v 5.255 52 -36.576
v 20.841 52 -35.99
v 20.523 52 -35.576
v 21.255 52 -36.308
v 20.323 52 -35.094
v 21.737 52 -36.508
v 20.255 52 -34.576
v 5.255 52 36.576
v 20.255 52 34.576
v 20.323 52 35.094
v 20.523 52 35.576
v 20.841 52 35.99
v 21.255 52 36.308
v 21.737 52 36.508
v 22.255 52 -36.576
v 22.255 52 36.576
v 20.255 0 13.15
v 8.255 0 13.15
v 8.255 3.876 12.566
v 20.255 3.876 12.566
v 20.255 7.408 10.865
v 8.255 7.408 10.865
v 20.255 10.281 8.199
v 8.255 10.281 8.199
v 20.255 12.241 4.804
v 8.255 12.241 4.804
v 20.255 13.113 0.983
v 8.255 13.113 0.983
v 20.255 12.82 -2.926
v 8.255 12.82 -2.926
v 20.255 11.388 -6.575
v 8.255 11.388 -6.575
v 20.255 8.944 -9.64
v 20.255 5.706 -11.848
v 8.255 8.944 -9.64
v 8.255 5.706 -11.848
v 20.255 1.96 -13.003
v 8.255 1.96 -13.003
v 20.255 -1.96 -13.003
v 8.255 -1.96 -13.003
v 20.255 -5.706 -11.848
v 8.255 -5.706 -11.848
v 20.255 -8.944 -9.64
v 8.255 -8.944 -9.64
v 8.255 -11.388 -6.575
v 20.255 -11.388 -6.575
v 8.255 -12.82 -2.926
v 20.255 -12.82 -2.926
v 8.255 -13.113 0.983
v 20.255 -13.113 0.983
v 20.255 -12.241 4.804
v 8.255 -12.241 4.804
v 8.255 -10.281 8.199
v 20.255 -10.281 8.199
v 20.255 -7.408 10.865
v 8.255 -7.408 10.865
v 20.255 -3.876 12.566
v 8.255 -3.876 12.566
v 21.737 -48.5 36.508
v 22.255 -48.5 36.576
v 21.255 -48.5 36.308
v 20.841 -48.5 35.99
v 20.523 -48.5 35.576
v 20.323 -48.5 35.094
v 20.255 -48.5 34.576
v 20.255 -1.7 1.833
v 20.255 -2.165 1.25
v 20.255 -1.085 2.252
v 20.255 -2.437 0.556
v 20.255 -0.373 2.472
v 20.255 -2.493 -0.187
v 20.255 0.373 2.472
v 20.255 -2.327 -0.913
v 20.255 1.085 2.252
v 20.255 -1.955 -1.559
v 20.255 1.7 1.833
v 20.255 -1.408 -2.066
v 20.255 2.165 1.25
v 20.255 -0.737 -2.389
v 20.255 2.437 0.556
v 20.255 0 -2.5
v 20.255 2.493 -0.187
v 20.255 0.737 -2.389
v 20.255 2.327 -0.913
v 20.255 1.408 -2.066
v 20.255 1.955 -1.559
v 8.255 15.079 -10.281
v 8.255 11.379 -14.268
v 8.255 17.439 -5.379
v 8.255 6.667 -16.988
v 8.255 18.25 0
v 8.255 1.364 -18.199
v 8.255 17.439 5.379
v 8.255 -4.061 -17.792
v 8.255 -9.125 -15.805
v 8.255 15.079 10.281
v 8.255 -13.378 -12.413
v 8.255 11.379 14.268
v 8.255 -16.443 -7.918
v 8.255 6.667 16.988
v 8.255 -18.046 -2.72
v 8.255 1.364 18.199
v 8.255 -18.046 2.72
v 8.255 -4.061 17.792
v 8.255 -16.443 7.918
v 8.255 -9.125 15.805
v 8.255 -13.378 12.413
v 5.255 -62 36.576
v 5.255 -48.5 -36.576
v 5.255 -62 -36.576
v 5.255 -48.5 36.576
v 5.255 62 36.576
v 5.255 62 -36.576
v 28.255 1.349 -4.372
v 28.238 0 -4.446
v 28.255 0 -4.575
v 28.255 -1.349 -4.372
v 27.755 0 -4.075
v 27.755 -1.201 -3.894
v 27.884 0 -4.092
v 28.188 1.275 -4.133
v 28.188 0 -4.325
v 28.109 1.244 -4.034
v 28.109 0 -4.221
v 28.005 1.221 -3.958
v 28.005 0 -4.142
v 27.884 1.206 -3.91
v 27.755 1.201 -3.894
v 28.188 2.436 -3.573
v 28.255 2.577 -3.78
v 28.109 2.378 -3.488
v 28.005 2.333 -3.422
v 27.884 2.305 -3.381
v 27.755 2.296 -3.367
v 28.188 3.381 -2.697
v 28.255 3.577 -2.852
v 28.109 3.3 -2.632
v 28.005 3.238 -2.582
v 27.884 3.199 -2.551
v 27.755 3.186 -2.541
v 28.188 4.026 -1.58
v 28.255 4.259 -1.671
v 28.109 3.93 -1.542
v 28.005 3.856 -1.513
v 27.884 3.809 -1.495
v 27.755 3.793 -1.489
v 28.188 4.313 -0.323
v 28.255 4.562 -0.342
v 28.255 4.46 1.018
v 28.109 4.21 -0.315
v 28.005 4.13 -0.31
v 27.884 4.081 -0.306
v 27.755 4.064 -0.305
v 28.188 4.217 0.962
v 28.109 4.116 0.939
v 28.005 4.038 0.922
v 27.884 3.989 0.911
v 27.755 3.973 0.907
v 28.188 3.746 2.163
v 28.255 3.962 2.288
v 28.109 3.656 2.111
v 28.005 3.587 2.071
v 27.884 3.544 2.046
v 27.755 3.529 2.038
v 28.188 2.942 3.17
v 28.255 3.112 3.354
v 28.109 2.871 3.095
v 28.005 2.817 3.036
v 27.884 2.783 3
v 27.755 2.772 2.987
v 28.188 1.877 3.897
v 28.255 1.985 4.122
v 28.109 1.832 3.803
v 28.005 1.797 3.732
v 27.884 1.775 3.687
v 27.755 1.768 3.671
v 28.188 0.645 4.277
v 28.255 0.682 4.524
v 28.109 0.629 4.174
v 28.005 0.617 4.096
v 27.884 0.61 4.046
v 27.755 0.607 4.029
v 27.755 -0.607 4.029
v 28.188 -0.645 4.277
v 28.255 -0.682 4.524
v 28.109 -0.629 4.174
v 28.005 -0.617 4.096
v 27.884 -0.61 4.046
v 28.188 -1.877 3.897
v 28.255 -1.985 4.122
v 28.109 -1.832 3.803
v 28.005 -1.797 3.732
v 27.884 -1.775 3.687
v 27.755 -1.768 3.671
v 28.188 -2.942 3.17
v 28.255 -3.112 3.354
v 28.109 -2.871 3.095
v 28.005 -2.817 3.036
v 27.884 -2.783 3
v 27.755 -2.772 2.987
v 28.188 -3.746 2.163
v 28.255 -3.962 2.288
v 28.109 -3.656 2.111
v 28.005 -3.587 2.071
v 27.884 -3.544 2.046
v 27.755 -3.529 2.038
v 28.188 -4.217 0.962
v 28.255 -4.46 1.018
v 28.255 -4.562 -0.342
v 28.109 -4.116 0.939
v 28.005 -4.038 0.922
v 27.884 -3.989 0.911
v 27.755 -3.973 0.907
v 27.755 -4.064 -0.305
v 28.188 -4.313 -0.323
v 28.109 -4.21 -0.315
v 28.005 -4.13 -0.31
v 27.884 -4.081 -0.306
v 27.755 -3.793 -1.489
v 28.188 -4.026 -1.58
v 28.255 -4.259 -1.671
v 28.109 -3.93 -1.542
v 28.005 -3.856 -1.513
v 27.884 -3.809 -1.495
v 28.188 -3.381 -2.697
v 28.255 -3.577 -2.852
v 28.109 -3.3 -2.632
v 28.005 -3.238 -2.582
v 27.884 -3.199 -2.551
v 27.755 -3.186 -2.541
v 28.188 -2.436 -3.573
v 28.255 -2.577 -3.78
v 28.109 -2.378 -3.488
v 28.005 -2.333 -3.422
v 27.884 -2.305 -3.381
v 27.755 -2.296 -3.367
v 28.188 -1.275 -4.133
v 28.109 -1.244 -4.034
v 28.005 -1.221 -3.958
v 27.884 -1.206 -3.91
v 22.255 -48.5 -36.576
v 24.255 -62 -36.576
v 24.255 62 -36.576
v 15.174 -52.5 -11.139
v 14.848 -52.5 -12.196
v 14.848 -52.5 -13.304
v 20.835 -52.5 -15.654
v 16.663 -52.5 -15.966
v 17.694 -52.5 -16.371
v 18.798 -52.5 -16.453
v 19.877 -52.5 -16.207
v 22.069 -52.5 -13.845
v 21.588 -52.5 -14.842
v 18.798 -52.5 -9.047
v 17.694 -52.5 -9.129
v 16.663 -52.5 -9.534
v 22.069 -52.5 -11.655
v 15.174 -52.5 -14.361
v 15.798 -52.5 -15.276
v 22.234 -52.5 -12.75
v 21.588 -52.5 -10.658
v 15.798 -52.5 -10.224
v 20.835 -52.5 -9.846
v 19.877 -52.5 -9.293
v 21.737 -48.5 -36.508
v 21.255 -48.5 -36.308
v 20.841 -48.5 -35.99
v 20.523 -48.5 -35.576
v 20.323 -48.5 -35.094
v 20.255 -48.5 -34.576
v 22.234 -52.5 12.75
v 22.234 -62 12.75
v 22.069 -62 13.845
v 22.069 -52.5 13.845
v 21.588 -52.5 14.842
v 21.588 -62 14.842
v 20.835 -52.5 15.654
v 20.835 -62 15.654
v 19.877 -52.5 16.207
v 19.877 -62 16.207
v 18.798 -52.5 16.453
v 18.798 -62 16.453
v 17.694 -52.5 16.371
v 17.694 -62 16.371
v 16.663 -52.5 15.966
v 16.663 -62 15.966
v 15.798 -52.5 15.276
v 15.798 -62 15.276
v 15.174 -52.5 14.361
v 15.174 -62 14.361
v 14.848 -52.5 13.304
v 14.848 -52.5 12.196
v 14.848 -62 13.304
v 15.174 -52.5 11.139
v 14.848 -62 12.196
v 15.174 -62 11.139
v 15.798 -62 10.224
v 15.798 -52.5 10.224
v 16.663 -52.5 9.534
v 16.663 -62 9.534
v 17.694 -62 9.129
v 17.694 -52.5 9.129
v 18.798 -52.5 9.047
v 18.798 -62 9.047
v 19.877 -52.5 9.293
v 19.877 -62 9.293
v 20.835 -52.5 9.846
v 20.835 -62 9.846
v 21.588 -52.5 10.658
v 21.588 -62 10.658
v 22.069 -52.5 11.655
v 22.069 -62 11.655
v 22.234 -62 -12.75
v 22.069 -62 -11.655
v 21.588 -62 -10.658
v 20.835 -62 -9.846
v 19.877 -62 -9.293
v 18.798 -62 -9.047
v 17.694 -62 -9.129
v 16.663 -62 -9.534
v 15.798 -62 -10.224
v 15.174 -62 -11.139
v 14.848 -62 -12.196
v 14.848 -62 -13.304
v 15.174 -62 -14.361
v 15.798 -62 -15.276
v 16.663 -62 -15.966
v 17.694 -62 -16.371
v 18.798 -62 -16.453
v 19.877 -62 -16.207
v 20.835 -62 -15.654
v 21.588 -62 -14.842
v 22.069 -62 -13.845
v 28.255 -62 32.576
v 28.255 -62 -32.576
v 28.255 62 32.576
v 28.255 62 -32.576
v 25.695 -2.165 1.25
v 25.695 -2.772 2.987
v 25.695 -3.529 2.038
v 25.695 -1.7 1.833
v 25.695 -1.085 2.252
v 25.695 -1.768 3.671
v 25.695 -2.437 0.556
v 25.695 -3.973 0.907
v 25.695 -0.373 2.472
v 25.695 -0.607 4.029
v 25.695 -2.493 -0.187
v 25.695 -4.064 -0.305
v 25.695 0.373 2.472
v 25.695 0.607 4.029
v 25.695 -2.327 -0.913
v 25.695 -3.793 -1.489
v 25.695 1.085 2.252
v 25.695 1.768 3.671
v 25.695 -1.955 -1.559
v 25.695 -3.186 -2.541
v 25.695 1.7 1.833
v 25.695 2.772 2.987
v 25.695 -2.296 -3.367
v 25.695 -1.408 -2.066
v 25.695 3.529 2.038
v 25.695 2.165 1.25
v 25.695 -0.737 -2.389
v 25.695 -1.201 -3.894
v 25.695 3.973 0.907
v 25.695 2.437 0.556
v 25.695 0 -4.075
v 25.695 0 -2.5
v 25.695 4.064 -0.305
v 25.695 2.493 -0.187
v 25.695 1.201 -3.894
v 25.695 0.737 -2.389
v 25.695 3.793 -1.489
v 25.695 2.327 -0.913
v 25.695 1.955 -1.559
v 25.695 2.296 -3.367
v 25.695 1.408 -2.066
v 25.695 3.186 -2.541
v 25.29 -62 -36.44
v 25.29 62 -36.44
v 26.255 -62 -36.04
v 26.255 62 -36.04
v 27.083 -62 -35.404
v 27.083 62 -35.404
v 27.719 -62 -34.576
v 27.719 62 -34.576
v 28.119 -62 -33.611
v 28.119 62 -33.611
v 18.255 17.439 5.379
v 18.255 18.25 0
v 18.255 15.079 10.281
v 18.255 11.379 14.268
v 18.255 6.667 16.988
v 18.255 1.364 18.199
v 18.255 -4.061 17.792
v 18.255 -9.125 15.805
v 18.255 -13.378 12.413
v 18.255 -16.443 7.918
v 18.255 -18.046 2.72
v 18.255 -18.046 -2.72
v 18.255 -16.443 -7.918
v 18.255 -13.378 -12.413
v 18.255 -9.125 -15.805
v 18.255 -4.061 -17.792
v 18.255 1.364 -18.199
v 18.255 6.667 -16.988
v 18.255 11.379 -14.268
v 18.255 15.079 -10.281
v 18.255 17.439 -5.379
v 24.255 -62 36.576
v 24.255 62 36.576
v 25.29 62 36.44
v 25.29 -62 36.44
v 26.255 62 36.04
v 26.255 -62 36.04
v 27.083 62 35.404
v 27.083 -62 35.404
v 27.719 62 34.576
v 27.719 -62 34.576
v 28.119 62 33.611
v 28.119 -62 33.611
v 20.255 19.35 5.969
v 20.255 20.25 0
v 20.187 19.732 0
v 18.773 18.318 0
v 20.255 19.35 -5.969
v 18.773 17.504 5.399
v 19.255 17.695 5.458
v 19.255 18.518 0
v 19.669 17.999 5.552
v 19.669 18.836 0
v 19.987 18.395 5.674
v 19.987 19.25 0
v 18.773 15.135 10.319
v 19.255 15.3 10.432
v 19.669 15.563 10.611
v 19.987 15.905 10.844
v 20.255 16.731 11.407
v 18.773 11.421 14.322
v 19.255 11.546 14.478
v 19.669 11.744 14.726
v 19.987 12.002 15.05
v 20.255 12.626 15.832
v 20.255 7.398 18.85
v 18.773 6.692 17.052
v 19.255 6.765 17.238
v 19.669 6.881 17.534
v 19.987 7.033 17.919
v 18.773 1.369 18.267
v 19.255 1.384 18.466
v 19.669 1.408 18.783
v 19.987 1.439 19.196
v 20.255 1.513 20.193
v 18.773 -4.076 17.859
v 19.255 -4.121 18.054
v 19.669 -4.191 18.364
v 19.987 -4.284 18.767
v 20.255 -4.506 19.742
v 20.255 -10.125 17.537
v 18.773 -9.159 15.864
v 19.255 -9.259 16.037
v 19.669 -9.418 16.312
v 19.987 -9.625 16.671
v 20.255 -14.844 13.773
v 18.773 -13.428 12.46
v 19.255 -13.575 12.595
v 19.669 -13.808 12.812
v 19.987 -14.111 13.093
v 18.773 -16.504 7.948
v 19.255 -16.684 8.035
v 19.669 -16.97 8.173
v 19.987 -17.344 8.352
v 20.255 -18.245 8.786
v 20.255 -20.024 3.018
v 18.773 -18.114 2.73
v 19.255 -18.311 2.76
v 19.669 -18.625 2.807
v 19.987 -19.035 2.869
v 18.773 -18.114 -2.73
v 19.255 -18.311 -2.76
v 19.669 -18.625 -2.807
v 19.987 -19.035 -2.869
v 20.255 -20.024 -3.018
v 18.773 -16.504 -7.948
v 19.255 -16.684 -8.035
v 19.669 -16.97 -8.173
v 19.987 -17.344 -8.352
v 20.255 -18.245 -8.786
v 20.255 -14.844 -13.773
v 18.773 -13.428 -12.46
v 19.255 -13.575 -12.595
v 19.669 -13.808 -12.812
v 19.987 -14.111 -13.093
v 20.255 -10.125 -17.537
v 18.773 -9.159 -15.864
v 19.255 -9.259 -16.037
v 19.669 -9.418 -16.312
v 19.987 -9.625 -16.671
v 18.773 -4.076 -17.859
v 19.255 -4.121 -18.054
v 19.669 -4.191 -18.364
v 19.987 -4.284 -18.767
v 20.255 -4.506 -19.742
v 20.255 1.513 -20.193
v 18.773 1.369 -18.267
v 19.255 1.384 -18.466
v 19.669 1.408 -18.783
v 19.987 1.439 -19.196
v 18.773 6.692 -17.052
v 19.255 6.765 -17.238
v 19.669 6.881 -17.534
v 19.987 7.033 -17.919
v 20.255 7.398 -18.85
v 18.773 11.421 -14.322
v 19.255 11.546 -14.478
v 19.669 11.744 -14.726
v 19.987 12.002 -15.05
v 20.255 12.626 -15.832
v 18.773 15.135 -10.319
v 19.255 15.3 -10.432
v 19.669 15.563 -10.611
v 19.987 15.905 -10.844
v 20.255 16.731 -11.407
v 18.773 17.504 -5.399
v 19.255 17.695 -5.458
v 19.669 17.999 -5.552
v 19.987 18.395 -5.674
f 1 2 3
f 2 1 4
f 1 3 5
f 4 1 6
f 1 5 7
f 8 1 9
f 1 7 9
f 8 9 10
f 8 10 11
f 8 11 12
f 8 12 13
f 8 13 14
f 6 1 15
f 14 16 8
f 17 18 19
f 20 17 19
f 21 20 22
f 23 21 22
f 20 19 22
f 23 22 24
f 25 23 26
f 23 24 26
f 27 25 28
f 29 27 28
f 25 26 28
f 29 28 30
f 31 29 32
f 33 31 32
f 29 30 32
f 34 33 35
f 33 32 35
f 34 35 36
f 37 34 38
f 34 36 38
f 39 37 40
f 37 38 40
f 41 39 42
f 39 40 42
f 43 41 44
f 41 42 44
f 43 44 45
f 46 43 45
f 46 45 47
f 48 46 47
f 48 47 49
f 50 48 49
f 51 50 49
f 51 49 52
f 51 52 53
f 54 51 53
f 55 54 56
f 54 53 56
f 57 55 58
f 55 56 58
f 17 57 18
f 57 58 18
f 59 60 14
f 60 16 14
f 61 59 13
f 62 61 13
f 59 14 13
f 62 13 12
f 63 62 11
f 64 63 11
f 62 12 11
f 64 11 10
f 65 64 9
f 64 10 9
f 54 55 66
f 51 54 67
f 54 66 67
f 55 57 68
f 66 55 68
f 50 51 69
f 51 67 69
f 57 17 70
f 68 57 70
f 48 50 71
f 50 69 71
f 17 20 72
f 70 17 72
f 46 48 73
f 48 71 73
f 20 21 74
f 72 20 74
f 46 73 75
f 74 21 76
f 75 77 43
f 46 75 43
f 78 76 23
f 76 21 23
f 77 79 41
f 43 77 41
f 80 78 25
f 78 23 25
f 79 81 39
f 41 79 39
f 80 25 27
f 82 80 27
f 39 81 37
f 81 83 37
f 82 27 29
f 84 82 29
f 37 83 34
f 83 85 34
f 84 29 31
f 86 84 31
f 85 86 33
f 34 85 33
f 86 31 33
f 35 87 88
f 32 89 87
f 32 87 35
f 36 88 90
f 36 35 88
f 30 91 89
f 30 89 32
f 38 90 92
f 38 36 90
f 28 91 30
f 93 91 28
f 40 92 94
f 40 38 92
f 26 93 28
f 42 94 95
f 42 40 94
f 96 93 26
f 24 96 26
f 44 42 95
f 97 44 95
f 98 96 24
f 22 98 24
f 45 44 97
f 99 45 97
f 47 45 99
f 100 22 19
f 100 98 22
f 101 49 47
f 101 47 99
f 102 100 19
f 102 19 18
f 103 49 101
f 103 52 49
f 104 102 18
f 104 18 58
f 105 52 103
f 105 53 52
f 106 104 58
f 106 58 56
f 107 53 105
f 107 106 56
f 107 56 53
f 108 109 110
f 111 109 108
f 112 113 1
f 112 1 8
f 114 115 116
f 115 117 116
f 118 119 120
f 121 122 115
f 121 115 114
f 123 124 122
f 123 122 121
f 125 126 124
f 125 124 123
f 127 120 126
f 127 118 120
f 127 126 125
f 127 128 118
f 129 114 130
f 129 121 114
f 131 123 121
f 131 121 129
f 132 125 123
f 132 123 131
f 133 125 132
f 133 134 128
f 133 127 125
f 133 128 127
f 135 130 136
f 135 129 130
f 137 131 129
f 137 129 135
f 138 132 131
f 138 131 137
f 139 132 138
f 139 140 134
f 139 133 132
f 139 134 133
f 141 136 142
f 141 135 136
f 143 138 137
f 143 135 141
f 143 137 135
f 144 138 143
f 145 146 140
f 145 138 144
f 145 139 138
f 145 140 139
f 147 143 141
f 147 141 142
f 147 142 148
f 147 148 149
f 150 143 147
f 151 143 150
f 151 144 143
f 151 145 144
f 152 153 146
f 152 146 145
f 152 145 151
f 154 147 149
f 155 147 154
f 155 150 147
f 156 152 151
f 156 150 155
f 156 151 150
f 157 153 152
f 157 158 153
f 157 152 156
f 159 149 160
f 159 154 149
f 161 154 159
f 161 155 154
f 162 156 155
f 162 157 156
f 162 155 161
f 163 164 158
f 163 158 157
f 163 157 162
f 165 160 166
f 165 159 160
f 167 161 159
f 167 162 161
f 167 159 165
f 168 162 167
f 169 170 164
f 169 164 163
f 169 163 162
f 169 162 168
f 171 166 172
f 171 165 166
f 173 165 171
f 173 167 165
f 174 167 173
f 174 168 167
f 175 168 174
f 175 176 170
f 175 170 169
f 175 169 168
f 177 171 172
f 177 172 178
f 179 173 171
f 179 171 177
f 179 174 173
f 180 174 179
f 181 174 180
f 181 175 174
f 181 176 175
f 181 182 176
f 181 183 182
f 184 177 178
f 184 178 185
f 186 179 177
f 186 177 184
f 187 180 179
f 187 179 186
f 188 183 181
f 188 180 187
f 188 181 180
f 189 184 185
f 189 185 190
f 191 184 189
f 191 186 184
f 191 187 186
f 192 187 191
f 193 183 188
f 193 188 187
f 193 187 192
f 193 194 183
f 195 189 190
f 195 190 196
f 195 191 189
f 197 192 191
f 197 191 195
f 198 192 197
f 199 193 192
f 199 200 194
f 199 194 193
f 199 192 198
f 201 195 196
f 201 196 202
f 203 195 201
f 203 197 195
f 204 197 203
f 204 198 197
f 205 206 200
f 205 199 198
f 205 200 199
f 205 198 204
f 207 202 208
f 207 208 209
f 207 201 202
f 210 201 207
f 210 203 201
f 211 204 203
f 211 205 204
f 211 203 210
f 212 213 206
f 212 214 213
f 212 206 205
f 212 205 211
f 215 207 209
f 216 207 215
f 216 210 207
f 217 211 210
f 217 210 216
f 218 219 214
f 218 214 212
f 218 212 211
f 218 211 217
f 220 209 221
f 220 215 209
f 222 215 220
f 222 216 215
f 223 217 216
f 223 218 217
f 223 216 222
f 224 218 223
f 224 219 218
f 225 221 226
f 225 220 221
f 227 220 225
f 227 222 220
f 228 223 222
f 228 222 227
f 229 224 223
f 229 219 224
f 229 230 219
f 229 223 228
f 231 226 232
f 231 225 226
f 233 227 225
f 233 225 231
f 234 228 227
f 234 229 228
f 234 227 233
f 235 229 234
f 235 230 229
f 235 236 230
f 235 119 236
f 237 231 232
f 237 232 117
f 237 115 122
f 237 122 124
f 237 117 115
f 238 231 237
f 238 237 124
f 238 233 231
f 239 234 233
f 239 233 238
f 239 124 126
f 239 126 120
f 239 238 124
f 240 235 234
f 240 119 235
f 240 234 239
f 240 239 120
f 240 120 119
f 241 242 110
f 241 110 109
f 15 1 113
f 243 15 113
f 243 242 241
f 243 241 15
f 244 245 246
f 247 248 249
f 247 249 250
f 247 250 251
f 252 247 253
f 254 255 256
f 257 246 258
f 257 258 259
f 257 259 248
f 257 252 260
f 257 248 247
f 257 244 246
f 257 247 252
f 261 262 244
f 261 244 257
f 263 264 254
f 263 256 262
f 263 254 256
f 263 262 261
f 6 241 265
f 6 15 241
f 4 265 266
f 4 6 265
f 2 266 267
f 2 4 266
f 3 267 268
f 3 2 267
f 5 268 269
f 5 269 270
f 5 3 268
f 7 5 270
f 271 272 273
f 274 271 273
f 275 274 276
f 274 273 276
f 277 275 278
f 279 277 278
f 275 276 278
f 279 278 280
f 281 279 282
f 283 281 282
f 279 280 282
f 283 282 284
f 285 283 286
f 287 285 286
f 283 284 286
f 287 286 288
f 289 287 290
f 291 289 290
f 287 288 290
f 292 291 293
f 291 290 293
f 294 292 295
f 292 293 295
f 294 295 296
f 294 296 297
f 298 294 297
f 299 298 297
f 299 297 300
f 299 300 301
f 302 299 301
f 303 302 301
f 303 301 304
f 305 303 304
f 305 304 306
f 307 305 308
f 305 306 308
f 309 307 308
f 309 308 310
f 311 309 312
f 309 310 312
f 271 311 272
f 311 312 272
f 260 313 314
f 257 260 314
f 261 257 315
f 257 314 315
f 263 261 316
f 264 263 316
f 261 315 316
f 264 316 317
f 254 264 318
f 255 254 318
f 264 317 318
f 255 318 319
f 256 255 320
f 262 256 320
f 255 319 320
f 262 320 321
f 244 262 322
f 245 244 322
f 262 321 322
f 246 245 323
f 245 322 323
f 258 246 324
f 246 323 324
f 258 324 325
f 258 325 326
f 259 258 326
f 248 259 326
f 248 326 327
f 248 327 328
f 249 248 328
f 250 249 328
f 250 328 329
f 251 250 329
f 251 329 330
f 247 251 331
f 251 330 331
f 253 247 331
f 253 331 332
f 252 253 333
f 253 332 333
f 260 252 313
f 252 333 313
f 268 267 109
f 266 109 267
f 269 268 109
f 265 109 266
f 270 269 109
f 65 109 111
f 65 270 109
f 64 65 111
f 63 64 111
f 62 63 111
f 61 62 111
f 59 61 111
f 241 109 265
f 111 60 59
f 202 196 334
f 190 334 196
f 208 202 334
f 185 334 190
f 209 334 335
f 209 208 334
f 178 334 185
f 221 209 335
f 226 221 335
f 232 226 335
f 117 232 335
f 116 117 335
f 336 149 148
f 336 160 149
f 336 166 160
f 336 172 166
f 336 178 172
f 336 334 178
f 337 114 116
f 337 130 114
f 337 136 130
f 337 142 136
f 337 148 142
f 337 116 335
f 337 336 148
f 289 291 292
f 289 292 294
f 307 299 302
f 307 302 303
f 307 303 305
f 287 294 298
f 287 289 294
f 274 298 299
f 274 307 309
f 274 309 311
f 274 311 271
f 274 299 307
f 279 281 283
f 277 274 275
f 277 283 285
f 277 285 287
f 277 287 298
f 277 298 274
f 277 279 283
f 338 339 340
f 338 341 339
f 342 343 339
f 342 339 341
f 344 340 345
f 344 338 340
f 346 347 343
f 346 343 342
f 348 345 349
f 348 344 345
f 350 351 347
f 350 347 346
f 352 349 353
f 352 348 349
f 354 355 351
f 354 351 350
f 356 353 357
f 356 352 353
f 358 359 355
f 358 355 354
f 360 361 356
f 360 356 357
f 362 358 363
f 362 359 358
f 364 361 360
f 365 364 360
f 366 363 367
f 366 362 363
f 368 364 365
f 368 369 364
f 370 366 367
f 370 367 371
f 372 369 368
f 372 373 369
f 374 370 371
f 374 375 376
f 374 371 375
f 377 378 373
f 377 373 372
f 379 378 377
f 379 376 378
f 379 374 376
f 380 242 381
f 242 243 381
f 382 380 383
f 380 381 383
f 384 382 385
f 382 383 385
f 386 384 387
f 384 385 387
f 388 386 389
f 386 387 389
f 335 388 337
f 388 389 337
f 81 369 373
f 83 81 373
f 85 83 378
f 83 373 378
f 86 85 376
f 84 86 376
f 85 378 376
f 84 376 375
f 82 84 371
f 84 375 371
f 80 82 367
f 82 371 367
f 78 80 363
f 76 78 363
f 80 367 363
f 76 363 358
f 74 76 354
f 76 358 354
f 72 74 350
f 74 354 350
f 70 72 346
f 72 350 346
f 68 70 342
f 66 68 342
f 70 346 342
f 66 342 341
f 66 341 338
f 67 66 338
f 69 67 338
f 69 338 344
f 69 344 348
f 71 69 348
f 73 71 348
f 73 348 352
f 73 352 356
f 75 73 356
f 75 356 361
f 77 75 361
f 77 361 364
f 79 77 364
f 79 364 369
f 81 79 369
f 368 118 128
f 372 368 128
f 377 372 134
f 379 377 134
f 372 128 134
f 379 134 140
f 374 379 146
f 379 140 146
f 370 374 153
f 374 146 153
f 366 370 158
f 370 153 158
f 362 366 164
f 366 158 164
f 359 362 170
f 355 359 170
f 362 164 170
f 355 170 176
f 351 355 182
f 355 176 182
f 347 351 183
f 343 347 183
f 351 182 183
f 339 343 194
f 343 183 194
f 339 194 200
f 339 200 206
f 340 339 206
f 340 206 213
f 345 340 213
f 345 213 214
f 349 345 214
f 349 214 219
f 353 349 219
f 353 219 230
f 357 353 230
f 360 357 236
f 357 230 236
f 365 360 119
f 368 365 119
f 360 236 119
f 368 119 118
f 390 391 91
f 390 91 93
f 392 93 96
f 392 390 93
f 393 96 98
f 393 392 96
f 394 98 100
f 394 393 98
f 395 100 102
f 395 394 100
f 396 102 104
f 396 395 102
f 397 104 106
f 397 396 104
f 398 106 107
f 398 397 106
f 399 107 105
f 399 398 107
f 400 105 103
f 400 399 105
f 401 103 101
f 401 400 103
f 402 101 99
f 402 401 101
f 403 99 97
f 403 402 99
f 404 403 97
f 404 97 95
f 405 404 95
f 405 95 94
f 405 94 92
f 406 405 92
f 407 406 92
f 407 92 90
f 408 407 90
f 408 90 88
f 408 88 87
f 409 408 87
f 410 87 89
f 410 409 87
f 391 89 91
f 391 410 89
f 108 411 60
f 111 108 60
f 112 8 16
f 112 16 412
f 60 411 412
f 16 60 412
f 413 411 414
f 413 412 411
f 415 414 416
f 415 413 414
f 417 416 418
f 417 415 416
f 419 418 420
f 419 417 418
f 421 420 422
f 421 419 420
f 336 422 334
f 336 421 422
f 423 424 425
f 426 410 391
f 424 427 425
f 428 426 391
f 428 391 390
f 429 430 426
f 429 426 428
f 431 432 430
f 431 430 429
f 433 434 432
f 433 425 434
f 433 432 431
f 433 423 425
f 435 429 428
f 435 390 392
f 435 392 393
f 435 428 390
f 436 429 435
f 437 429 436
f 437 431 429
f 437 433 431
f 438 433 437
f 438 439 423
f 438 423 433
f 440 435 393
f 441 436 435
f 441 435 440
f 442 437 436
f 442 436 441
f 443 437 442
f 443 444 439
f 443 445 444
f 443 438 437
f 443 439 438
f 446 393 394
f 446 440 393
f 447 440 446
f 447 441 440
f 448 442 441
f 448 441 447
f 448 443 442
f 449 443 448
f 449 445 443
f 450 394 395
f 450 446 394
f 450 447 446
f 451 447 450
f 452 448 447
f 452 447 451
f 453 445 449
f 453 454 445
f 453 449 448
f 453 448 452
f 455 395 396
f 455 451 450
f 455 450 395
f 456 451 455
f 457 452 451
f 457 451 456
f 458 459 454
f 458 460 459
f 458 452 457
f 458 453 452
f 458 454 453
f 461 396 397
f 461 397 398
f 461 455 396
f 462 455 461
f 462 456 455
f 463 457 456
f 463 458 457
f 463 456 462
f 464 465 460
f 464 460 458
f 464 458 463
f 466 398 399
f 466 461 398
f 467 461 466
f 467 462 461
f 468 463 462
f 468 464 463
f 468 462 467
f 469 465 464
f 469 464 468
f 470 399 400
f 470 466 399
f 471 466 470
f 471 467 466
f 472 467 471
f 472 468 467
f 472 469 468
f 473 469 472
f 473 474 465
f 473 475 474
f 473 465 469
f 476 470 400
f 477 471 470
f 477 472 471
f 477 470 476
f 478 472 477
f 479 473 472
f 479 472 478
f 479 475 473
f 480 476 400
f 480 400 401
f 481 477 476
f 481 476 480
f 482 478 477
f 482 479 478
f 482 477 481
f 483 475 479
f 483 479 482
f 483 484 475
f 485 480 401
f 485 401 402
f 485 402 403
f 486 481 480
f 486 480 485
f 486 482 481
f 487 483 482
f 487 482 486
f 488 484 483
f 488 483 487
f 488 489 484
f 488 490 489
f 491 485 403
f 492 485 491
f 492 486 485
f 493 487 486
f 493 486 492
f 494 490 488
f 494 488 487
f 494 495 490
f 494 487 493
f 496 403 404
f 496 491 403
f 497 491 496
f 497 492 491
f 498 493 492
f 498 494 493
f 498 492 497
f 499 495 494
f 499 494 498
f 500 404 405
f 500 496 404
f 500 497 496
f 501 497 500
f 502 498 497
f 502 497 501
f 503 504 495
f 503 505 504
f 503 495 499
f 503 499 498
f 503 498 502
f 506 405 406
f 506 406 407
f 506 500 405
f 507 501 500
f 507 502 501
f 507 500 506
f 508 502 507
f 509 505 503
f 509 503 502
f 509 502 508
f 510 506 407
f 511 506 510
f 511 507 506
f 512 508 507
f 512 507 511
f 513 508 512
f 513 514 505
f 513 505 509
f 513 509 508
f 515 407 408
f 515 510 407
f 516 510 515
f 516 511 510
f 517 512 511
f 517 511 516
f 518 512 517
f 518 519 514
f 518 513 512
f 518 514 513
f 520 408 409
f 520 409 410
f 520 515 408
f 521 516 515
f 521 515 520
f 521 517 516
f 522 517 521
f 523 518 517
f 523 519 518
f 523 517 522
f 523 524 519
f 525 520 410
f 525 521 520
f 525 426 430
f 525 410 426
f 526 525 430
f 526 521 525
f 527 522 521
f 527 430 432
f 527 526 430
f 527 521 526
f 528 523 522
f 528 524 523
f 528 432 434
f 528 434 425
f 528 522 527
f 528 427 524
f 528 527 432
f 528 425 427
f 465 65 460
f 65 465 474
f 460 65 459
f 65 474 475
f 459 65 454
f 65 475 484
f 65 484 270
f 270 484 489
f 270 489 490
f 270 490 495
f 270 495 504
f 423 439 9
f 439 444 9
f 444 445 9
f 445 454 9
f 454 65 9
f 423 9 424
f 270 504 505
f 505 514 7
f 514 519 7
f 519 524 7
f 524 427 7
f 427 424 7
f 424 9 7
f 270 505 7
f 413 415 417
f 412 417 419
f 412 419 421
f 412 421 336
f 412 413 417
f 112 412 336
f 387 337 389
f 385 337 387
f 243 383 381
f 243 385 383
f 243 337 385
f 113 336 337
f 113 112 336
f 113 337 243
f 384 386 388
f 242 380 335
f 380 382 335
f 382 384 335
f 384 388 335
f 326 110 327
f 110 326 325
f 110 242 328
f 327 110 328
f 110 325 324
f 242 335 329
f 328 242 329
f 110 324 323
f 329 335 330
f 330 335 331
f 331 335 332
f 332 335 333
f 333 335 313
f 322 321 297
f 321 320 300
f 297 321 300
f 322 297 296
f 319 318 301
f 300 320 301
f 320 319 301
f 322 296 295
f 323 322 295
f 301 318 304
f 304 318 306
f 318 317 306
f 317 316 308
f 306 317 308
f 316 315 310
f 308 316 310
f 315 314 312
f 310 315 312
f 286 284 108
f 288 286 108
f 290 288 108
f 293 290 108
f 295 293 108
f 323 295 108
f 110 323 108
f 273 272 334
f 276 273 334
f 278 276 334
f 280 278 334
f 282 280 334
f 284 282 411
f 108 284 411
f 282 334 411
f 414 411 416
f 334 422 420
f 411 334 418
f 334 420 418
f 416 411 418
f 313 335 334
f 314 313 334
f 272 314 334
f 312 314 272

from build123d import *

# Parameters (mm, degrees)
SKETCH1_W           = 12
SKETCH1_H           = 18.25
SKETCH2_R           = 3.7145
CUT_EXTRUDE1_DEPTH  = 8.5725
SKETCH3_W           = 73.152
SKETCH3_H           = 124
BOSS_EXTRUDE1_DEPTH = 8
FILLET1_R           = 4
SKETCH6_R           = 13.15
CUT_EXTRUDE2_DEPTH  = 12
SKETCH12_R          = 4.075
CUT_EXTRUDE6_DEPTH  = 2.56
SKETCH12_6_R        = 2.5
CUT_EXTRUDE7_DEPTH  = 8
FILLET2_R           = 0.5
SKETCH13_W          = 73.152
SKETCH13_H          = 13.5
SKETCH13_H_2        = 10
BOSS_EXTRUDE3_DEPTH = 15
FILLET3_R           = 2
SKETCH14_R          = 3.71375
CUT_EXTRUDE8_DEPTH  = 9.5


with BuildPart() as part:
    # Sketch1 → Revolve1 (revolve)
    with BuildSketch(Plane.XY):
        with Locations((14.255, 9.125)):
            Rectangle(SKETCH1_W, SKETCH1_H)
    revolve(axis=Axis((8.255, 0, 0), (1, 0, 0)))

    # Sketch2 → Cut-Extrude1 (cut)
    with BuildSketch(Plane.ZY.offset(-8.255)):
        Circle(SKETCH2_R)
    extrude(amount=-CUT_EXTRUDE1_DEPTH, mode=Mode.SUBTRACT)

    # Sketch6 → Cut-Extrude2 (cut)
    with BuildSketch(Plane.ZY.offset(-8.255)):
        Circle(SKETCH6_R)
    extrude(amount=-CUT_EXTRUDE2_DEPTH, mode=Mode.SUBTRACT)


with BuildPart() as body_2:
    # Sketch3 → Boss-Extrude1 (new body)
    with BuildSketch(Plane(origin=(20.255, 0, 0), x_dir=(0, 0, -1), z_dir=(1, 0, 0))):
        Rectangle(SKETCH3_W, SKETCH3_H)
    extrude(amount=BOSS_EXTRUDE1_DEPTH)

    # Fillet1
    fillet1_edges = [body_2.edges().sort_by_distance(p)[0] for p in [
        (28.255, 0, -36.576),
        (28.255, 0, 36.576),
    ]]
    fillet(fillet1_edges, radius=FILLET1_R)

    # Sketch12 → Cut-Extrude6 (cut)
    with BuildSketch(Plane(origin=(28.255, 0, 0), x_dir=(0, 0, -1), z_dir=(1, 0, 0))):
        Circle(SKETCH12_R)
    extrude(amount=-CUT_EXTRUDE6_DEPTH, mode=Mode.SUBTRACT)

    # Sketch12<6> → Cut-Extrude7 (cut)
    with BuildSketch(Plane(origin=(28.255, 0, 0), x_dir=(0, 0, -1), z_dir=(1, 0, 0))):
        Circle(SKETCH12_6_R)
    extrude(amount=-CUT_EXTRUDE7_DEPTH, mode=Mode.SUBTRACT)

    # Fillet2
    fillet2_edges = [body_2.edges().sort_by_distance(p)[0] for p in [
        (28.255, 0, 4.075),
    ]]
    fillet(fillet2_edges, radius=FILLET2_R)


with BuildPart() as part_1:
    add(part.part)

    # Combine1: union body 2
    add(body_2.part)

    # Sketch13 → Boss-Extrude3 (add)
    with BuildSketch(Plane.ZY.offset(-20.255)):
        with Locations((0, -55.25)):
            Rectangle(SKETCH13_W, SKETCH13_H)
        with Locations((0, 57)):
            Rectangle(SKETCH13_W, SKETCH13_H_2)
    extrude(amount=BOSS_EXTRUDE3_DEPTH)

    # Fillet3
    fillet3_edges = [part_1.edges().sort_by_distance(p)[0] for p in [
        (20.255, -18.25, 0),
        (20.255, 1.75, 36.576),
        (20.255, 1.75, -36.576),
    ]]
    fillet(fillet3_edges, radius=FILLET3_R)

    # Sketch14 → Cut-Extrude8 (cut)
    with BuildSketch(Plane.XZ.offset(62)):
        with Locations((18.52, 12.75)):
            Circle(SKETCH14_R)
        with Locations((18.52, -12.75)):
            Circle(SKETCH14_R)
    extrude(amount=-CUT_EXTRUDE8_DEPTH, mode=Mode.SUBTRACT)


solid = part_1.part
